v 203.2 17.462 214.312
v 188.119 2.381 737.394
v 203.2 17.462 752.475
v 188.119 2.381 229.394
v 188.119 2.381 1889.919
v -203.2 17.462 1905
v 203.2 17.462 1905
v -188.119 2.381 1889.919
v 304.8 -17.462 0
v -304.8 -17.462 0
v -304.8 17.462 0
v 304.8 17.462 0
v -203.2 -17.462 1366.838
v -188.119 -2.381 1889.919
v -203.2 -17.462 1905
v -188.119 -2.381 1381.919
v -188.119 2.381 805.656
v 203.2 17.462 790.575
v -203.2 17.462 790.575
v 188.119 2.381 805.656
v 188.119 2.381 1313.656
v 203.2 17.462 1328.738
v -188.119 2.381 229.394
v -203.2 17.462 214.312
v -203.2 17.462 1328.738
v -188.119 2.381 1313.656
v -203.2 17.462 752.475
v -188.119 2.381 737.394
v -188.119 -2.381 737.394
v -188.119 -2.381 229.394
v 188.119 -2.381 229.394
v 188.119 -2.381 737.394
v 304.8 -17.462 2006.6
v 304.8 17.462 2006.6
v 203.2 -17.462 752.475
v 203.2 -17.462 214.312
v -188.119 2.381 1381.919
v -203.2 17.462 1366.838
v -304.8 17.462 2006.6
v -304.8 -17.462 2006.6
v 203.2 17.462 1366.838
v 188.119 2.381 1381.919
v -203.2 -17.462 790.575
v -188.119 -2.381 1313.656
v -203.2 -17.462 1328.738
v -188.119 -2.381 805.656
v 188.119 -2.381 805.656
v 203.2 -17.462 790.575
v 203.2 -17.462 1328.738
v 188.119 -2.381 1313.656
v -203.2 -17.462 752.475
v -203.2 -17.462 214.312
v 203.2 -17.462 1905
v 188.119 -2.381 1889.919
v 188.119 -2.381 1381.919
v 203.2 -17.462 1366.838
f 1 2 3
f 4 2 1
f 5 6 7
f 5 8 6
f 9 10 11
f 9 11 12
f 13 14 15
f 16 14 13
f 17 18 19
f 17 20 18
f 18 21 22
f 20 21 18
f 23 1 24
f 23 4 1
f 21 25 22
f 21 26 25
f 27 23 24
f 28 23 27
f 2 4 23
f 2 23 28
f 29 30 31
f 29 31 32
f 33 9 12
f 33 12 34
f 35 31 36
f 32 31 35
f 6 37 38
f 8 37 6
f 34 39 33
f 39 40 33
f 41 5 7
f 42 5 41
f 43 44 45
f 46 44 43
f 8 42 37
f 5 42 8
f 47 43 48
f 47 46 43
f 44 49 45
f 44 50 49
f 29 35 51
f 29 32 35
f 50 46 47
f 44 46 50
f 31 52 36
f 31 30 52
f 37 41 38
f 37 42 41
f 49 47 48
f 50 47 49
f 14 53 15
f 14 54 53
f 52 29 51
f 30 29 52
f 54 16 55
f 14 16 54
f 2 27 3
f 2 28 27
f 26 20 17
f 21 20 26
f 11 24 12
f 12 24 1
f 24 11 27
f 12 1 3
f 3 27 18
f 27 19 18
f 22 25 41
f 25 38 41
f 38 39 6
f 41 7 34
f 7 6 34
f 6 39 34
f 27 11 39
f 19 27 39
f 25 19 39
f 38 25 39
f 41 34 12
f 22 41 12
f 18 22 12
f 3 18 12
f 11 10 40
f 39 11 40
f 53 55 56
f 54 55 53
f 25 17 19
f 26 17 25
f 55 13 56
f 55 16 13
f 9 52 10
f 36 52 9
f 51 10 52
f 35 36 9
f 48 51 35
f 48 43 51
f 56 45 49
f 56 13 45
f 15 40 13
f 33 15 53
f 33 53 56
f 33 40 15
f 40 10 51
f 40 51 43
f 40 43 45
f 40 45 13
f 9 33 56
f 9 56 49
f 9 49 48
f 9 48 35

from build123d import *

# Parameters (mm, degrees)
F0_W     = 609.6
F0_H     = 2006.6
F0_W_2   = 406.4
F0_H_2   = 538.1625
F1_DEPTH = 17.4625
F2_W     = 406.4
F2_H     = 538.1625
F3_DEPTH = 15.08125
F3_TAPER = 45
F4_W     = 406.4
F4_H     = 538.1625
F5_DEPTH = 15.08125
F5_TAPER = 45


with BuildPart() as f1:
    # F0 (on Front) → F1 (new body, symmetric)
    with BuildSketch(Plane.XZ):
        with Locations((0, 1003.3)):
            Rectangle(F0_W, F0_H)
        with Locations((0, 483.39375)):
            Rectangle(F0_W_2, F0_H_2, mode=Mode.SUBTRACT)
        with Locations((0, 1059.65625)):
            Rectangle(F0_W_2, F0_H_2, mode=Mode.SUBTRACT)
        with Locations((0, 1635.91875)):
            Rectangle(F0_W_2, F0_H_2, mode=Mode.SUBTRACT)
        with Locations((0, 483.39375)):
            Rectangle(F0_W_2, F0_H_2)
        with Locations((0, 1059.65625)):
            Rectangle(F0_W_2, F0_H_2)
        with Locations((0, 1635.91875)):
            Rectangle(F0_W_2, F0_H_2)
    extrude(amount=F1_DEPTH, both=True)

    # F2 (on face) → F3 (cut)
    with BuildSketch(Plane(origin=(0, 17.4625, 0), x_dir=(-1, 0, 0), z_dir=(0, 1, 0))):
        with Locations((0, 1635.91875)):
            Rectangle(F2_W, F2_H)
        with Locations((0, 1059.65625)):
            Rectangle(F2_W, F2_H)
        with Locations((0, 483.39375)):
            Rectangle(F2_W, F2_H)
    extrude(amount=-F3_DEPTH, taper=F3_TAPER, mode=Mode.SUBTRACT)

    # F4 (on face) → F5 (cut)
    with BuildSketch(Plane.XZ.offset(17.4625)):
        with Locations((0, 1635.91875)):
            Rectangle(F4_W, F4_H)
        with Locations((0, 1059.65625)):
            Rectangle(F4_W, F4_H)
        with Locations((0, 483.39375)):
            Rectangle(F4_W, F4_H)
    extrude(amount=-F5_DEPTH, taper=F5_TAPER, mode=Mode.SUBTRACT)


solid = f1.part
